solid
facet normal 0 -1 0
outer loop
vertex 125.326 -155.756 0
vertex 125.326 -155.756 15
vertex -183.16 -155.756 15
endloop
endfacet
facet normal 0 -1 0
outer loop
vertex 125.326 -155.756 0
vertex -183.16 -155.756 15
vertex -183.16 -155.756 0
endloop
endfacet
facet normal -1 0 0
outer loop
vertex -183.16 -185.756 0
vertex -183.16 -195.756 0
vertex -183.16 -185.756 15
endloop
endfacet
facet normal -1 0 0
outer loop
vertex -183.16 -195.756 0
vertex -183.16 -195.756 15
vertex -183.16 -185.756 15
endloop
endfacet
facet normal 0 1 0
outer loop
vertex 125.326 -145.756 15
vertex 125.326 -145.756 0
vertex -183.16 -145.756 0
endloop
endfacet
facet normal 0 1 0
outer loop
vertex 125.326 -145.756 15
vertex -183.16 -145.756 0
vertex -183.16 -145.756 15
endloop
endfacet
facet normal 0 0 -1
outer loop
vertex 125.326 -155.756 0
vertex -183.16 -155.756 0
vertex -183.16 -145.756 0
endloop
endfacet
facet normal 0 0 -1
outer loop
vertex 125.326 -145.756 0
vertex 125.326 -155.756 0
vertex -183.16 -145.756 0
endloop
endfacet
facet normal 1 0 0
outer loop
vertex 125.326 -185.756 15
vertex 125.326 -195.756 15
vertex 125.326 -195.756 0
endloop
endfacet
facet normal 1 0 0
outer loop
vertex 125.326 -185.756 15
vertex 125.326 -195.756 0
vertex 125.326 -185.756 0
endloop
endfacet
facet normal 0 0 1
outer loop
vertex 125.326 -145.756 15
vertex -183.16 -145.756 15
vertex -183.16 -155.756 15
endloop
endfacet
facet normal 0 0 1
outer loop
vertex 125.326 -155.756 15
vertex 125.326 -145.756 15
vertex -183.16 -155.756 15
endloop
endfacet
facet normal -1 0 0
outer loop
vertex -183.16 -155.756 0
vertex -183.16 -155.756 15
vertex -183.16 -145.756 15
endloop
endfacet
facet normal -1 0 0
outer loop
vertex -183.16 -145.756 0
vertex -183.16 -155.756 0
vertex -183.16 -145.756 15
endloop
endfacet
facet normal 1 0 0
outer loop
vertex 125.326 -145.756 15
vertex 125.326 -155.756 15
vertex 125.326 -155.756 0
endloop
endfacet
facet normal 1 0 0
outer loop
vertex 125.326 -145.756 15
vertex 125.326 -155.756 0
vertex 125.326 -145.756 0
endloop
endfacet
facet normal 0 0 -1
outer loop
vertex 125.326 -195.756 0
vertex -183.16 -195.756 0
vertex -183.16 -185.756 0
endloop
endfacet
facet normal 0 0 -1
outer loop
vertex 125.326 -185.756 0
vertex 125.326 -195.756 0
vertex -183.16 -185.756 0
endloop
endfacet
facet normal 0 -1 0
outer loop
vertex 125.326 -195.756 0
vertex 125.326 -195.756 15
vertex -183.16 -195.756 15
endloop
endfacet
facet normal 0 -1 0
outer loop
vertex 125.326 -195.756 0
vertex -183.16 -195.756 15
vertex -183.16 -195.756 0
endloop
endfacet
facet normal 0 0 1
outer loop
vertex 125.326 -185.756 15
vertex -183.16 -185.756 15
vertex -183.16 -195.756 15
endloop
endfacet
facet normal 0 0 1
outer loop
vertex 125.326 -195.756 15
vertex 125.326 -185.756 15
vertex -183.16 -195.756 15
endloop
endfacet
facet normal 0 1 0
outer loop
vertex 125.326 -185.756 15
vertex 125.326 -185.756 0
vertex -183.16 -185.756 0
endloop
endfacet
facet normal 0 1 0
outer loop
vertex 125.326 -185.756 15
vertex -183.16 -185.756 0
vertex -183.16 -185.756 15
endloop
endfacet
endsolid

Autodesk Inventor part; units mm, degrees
ref_plane "YZ Plane" through (0, 0, 0) normal (1, 0, 0) x (0, 1, 0)
ref_plane "XZ Plane" through (0, 0, 0) normal (0, 1, 0) x (-1, 0, 0)
ref_plane "工作平面1" through (125.3258, -174.2563, 26.6747) normal (1, 0, 0) x (0, 1, 0)
sketch "草圖1" plane through (125.3258, -174.2563, 26.6747) normal (1, 0, 0) x (0, 1, 0)
  arc A0 (0, -1.1604) -> (0, 1.1604) centre (0, 0) ccw projected
  arc A1 (-11.4249, 30.749) -> (0, 1.1604) centre (0, 18.1604) ccw projected
  arc A2 (-11.4249, 30.749) -> (0, -1.1604) centre (0, 16.8396) ccw projected
  line L0 (146.0063, -26.6747) -> (-33.9937, -26.6747) construction
  line L1 (-21.5, -26.6747) -> (-11.5, -26.6747)
  line L2 (-11.5, -26.6747) -> (-11.5, -11.6747)
  line L3 (-11.5, -11.6747) -> (-21.5, -11.6747)
  line L4 (-21.5, -11.6747) -> (-21.5, -26.6747)
  line L5 (18.5, -26.6747) -> (28.5, -26.6747)
  line L6 (28.5, -26.6747) -> (28.5, -11.6747)
  line L7 (28.5, -11.6747) -> (18.5, -11.6747)
  line L8 (18.5, -11.6747) -> (18.5, -26.6747)
  circle A3 centre (7, 0.0707) radius 1.1024 projected
  line L9 (3.5, 0) -> (3.5, -26.6747) construction
  point P0 (174.2563, -26.6747)
  dimension "d0" = 30
  dimension "d1" = 3.5
  dimension "d2" = 10
  dimension "d3" = 15
ref_plane "工作平面2" through (-183.1603, -208.25, 0) normal (1, 0, 0) x (0, 1, 0)
extrude "擠出1" add sketch "草圖1" against normal up to surface (308.4861 mm away) contours L4 L3 L2 L1 | L8 L7 L6 L5
properties part number "長方形塊"
